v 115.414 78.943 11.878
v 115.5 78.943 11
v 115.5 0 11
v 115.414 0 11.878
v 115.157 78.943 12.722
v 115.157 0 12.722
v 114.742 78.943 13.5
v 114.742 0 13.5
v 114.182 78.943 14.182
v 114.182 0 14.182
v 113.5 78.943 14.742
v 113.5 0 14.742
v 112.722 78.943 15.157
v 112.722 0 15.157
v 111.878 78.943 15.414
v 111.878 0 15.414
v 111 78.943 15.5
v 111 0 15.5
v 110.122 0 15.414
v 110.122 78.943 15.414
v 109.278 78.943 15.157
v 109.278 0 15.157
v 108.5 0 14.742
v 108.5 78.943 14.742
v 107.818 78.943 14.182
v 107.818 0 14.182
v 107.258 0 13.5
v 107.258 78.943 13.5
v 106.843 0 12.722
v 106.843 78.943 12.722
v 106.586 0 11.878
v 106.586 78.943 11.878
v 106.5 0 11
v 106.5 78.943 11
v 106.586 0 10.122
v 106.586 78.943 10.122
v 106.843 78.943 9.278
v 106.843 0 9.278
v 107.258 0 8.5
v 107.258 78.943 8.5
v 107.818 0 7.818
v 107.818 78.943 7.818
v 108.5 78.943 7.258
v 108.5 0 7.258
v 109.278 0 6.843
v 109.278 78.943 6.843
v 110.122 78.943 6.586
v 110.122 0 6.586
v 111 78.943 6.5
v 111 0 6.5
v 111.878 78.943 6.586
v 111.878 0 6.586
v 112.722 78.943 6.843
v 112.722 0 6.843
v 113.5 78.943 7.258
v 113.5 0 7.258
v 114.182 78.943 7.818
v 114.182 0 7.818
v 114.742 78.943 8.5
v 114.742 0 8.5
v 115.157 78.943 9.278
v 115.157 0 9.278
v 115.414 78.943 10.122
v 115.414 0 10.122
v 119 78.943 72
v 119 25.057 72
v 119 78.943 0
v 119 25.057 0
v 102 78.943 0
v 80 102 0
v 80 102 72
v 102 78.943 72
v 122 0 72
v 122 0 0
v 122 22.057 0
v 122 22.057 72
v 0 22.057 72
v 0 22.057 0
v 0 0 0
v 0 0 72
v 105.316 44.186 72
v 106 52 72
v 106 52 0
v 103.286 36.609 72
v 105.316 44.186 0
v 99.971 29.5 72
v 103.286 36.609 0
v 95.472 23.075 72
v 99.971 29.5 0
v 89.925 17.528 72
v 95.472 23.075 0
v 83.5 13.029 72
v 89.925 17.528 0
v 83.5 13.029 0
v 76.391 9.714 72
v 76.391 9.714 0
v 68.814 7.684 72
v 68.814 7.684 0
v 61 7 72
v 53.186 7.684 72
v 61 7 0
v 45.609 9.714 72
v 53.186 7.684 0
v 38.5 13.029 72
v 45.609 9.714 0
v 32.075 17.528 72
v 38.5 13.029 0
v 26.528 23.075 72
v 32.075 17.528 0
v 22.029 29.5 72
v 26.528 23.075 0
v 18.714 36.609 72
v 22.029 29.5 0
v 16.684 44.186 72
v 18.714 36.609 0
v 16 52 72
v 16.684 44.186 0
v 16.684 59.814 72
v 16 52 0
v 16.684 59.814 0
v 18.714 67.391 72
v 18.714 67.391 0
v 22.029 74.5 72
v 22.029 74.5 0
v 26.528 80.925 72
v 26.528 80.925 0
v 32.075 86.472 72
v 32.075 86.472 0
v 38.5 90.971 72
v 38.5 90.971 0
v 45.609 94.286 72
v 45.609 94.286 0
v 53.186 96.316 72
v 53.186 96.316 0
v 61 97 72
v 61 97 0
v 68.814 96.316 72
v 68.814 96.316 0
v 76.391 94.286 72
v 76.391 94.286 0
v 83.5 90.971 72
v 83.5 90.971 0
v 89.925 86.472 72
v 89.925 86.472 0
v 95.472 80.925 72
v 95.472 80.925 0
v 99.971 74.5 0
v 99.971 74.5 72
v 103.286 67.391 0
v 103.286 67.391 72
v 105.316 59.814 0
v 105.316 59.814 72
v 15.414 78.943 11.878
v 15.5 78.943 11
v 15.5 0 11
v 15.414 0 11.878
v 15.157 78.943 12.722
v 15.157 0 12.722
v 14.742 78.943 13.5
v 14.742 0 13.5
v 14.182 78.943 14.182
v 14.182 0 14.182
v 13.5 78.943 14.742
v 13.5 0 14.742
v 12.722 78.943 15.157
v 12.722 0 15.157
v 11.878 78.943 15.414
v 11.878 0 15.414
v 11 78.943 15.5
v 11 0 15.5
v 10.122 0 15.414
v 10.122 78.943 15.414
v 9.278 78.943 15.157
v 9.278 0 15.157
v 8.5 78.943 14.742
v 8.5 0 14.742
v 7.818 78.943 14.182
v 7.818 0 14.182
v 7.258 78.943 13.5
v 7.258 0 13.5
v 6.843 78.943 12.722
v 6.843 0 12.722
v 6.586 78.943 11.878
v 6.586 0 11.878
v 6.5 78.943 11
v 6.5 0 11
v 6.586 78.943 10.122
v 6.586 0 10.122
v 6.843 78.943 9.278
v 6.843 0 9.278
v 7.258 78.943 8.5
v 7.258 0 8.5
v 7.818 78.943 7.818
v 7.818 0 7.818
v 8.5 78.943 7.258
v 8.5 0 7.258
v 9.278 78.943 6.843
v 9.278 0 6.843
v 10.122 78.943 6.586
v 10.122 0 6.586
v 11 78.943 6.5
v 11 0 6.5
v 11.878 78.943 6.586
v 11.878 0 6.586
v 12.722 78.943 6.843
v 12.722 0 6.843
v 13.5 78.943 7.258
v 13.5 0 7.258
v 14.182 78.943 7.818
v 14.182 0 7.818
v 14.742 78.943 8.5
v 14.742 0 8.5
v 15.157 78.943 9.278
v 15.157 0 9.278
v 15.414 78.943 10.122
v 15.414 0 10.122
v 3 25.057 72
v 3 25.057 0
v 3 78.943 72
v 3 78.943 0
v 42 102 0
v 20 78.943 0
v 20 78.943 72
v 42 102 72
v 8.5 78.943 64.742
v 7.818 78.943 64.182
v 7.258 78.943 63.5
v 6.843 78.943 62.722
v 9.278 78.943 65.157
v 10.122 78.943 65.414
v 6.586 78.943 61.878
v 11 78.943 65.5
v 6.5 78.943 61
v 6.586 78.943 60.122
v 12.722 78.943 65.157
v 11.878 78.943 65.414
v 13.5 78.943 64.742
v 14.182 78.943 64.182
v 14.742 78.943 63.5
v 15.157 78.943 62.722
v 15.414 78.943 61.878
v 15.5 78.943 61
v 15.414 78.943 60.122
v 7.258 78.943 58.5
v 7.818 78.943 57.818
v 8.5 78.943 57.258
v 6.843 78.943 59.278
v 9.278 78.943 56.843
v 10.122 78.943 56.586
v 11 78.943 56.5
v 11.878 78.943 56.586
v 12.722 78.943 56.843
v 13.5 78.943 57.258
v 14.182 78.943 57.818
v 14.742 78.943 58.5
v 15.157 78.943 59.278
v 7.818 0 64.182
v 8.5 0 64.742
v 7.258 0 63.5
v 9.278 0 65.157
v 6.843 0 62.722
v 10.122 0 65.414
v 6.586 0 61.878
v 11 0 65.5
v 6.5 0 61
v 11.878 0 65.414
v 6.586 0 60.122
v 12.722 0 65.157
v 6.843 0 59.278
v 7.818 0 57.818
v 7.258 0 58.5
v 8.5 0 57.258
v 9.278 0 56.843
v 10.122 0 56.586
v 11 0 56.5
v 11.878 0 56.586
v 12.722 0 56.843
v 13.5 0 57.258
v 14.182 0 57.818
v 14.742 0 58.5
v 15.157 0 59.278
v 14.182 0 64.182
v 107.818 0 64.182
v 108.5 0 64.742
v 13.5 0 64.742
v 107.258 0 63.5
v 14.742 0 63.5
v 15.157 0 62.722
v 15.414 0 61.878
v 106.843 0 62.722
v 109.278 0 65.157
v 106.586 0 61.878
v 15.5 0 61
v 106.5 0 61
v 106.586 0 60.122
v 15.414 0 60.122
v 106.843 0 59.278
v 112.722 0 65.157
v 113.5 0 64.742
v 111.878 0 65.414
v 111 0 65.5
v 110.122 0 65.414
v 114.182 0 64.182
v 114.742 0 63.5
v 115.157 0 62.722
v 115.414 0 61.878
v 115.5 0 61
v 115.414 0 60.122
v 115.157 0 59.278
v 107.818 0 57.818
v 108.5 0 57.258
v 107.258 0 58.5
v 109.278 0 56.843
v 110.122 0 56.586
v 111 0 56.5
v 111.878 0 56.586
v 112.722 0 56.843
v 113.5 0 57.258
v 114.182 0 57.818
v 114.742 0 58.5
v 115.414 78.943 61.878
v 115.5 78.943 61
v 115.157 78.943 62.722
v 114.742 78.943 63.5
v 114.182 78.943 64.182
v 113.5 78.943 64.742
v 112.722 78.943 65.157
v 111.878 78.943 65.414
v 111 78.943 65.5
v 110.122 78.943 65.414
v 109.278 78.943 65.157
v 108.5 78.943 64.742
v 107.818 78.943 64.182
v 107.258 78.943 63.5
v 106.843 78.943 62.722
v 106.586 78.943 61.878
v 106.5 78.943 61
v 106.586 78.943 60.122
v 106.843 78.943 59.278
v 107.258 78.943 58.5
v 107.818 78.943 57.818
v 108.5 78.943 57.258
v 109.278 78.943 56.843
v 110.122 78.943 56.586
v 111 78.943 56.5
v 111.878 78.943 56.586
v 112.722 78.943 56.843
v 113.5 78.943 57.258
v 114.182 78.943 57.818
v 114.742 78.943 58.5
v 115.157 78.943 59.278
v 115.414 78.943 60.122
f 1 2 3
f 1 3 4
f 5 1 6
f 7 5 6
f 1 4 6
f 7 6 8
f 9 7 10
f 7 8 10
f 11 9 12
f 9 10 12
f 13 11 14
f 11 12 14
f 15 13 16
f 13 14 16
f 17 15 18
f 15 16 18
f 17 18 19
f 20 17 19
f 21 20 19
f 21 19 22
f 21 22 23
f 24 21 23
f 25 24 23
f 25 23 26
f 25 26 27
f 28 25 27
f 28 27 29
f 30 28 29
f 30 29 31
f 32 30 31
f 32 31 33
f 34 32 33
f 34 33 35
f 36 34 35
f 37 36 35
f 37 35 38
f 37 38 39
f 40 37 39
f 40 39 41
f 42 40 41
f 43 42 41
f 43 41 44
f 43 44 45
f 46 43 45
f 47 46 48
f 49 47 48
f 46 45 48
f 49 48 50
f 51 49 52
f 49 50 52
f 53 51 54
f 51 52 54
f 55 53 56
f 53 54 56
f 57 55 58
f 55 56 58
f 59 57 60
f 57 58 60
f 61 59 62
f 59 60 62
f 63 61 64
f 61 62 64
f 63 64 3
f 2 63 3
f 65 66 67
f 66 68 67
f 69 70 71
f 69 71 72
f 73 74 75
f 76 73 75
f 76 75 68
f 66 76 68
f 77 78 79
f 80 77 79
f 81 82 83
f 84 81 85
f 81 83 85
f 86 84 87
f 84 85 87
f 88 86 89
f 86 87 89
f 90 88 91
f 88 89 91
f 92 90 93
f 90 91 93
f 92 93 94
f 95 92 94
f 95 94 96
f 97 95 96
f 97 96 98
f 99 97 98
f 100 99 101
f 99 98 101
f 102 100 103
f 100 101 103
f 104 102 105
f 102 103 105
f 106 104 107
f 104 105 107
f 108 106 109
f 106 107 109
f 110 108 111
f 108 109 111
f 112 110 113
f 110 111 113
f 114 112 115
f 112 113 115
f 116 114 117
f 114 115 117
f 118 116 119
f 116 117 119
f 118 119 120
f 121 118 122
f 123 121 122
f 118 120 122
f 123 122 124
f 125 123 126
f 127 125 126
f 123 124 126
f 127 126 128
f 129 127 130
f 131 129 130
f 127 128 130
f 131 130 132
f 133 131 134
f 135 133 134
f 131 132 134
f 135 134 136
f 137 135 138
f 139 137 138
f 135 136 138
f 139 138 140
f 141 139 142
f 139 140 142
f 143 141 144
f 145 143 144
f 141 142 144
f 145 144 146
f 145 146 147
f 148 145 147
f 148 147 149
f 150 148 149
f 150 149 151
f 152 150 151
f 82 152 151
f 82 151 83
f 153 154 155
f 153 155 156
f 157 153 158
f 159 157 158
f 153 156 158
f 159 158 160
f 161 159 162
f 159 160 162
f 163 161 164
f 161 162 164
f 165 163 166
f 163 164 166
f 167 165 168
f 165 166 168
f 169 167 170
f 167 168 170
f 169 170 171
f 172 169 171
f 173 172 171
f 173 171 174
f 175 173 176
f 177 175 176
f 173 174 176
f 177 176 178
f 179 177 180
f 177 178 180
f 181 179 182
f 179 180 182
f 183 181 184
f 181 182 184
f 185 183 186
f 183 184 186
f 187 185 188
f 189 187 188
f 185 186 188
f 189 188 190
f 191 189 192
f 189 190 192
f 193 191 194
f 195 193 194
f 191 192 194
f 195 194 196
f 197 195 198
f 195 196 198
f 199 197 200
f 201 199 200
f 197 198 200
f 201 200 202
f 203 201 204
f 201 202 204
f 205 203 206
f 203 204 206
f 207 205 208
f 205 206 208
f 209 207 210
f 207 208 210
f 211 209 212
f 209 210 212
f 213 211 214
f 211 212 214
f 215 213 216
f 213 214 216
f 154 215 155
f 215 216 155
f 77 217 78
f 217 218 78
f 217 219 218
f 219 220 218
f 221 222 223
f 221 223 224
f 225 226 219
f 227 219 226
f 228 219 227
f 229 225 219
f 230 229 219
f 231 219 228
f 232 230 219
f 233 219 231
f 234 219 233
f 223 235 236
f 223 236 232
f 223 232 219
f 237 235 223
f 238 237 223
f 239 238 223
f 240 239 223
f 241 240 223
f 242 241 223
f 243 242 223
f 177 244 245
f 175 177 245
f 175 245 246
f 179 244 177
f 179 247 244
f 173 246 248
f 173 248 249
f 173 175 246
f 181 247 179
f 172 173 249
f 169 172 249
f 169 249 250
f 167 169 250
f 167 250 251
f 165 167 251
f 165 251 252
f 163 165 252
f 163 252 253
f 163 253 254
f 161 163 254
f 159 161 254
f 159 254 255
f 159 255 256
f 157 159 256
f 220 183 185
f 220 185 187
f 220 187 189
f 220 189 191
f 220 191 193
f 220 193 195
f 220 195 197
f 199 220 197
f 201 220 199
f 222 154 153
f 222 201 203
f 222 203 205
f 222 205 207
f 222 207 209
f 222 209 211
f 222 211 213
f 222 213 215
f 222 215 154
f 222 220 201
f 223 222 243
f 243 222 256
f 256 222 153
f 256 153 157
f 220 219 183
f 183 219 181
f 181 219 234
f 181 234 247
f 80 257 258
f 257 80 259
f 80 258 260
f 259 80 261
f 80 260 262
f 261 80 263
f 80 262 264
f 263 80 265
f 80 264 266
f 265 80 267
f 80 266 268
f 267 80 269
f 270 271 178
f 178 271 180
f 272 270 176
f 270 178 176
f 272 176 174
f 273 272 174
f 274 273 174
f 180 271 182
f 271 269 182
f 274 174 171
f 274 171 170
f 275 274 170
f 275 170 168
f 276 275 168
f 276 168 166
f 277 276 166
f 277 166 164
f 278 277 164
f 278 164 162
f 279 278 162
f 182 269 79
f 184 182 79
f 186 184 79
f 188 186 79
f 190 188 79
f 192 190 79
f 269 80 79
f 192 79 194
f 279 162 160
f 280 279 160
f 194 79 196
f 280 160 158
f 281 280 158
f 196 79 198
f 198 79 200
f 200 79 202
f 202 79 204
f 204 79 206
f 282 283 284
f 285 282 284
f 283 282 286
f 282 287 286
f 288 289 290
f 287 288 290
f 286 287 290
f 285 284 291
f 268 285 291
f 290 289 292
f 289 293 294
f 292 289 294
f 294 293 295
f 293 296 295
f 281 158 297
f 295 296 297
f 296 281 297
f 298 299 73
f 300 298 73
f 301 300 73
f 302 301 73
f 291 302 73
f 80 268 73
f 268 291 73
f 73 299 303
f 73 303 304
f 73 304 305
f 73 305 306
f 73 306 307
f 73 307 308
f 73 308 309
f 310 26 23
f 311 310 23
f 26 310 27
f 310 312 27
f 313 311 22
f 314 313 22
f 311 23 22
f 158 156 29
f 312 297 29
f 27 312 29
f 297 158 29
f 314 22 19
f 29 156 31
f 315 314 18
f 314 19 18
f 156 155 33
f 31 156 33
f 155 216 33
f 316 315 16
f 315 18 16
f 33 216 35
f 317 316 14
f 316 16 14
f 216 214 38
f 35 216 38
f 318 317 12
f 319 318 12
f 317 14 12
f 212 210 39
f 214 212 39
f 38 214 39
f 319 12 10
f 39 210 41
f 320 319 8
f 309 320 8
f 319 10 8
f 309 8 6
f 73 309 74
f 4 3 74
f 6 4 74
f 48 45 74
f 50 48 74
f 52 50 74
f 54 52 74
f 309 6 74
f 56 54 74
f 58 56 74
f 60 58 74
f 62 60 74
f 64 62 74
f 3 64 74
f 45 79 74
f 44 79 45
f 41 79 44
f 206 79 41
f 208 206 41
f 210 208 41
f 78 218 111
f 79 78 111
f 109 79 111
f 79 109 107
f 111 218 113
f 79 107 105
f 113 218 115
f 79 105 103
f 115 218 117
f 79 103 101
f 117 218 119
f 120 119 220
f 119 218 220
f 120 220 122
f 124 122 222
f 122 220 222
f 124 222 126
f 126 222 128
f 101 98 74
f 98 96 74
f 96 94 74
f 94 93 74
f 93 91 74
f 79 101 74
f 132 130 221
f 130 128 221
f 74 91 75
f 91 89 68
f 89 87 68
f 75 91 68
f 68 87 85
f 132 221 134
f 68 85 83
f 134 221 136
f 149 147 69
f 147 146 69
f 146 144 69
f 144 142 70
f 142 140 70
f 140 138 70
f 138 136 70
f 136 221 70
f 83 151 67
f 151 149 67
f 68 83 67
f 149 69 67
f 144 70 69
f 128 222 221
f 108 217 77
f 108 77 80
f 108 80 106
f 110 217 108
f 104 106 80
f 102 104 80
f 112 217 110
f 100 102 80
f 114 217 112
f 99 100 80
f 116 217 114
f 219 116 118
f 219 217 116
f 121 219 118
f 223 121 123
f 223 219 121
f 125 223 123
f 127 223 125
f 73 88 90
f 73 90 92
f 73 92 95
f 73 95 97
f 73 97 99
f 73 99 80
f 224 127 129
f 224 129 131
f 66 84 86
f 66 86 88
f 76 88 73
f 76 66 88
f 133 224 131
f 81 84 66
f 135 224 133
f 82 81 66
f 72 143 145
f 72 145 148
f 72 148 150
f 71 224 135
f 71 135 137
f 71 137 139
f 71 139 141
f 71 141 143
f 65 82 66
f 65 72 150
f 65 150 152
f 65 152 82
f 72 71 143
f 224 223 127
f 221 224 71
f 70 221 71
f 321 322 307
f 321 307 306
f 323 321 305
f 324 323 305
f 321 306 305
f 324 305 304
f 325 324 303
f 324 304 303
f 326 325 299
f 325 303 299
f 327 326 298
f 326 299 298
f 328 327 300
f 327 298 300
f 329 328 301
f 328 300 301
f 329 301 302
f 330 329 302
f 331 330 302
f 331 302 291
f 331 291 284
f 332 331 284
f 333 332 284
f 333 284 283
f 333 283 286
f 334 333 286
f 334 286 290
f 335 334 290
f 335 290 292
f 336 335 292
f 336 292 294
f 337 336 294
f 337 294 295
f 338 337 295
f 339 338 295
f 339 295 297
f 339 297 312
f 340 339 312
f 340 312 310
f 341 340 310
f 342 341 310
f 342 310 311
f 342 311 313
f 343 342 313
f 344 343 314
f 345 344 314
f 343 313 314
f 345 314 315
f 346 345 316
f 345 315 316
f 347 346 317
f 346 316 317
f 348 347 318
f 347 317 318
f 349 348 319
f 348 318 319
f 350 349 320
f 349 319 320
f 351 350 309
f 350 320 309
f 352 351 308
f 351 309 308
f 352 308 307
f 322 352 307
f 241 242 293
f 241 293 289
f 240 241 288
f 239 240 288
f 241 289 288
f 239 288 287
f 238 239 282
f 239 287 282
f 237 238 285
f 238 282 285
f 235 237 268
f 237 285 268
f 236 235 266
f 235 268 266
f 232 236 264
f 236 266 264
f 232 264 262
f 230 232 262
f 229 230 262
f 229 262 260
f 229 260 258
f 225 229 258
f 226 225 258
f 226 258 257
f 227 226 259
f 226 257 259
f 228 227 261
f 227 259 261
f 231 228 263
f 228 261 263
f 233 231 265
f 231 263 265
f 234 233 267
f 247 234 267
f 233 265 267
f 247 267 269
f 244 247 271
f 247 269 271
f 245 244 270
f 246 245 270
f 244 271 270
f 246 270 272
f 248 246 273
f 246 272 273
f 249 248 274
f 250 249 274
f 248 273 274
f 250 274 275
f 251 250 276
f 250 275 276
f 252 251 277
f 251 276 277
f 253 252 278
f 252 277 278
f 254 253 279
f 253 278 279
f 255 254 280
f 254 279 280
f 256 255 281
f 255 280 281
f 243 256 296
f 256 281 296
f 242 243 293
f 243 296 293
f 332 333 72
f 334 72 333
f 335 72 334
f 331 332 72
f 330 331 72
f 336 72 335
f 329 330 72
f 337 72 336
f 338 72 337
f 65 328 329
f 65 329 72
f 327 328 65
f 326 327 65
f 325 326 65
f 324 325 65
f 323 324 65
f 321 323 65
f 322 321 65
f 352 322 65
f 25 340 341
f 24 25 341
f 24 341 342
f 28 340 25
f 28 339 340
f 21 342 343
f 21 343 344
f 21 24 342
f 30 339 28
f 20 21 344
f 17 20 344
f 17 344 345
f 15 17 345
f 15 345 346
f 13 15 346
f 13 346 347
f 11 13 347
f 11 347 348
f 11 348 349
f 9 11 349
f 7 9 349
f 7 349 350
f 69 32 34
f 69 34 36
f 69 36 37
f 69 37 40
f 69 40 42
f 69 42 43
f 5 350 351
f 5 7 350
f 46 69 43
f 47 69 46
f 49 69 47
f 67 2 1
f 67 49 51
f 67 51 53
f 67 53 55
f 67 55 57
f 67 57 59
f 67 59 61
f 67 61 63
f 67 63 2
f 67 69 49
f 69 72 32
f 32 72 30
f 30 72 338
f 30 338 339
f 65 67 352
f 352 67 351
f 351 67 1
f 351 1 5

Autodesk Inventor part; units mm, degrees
ref_plane "YZ Plane" through (0, 0, 0) normal (1, 0, 0) x (0, 1, 0)
ref_plane "XZ Plane" through (0, 0, 0) normal (0, 1, 0) x (-1, 0, 0)
ref_plane "XY Plane" through (0, 0, 0) normal (0, 0, 1) x (1, 0, 0)
sketch "Sketch1" plane through (0, 0, 0) normal (0, 0, 1) x (1, 0, 0)
  line L0 (0, 0) -> (122, 0)
  circle A0 centre (61, 52) radius 45
  line L1 (3, 78.943) -> (20, 78.943)
  line L2 (20, 78.943) -> (42, 102)
  line L3 (42, 102) -> (80, 102)
  line L4 (80, 102) -> (102, 78.943)
  line L5 (102, 78.943) -> (119, 78.943)
  line L6 (3, 25.057) -> (0, 22.057)
  line L7 (0, 22.057) -> (0, 0)
  line L8 (122, 0) -> (122, 22.057)
  line L9 (122, 22.057) -> (119, 25.057)
  line L10 (119, 25.057) -> (119, 78.943)
  line L11 (16, 52) -> (3, 52)
  line L12 (3, 52) -> (3, 25.057)
  line L13 (3, 52) -> (3, 78.943)
  point P0 (61, 0)
  point P1 (61, 102)
  dimension "d3" = 90
  dimension "d0" = 79
  dimension "d1" = 122
  dimension "d2" = 52
  dimension "d4" = 17
  dimension "d5" = 38
  dimension "d6" = 102
  dimension "d7" = 116
  dimension "d8" = 135
extrude "Extrusion1" add sketch "Sketch1" along normal blind 72
sketch "Sketch2" plane through (0, 0, 0) normal (0, -1, 0) x (1, 0, 0)
  line L0 (11, 11) -> (111, 11) construction
  line L1 (111, 11) -> (111, 61) construction
  line L2 (111, 61) -> (11, 61) construction
  line L3 (11, 61) -> (11, 11) construction
  circle A0 centre (11, 11) radius 4.5
  circle A1 centre (111, 11) radius 4.5
  circle A2 centre (111, 61) radius 4.5
  circle A3 centre (11, 61) radius 4.5
  line L4 (0, 72) -> (122, 72) construction
  line L5 (0, 0) -> (0, 72) construction
  point P0 (61, 61)
  point P1 (61, 72)
  point P2 (11, 36)
  point P3 (0, 36)
  dimension "d11" = 100
  dimension "d12" = 50
  dimension "d13" = 9
extrude "Extrusion2" cut sketch "Sketch2" against normal up to surface (78.943 mm away)
properties part number "Spindle_Holder"
